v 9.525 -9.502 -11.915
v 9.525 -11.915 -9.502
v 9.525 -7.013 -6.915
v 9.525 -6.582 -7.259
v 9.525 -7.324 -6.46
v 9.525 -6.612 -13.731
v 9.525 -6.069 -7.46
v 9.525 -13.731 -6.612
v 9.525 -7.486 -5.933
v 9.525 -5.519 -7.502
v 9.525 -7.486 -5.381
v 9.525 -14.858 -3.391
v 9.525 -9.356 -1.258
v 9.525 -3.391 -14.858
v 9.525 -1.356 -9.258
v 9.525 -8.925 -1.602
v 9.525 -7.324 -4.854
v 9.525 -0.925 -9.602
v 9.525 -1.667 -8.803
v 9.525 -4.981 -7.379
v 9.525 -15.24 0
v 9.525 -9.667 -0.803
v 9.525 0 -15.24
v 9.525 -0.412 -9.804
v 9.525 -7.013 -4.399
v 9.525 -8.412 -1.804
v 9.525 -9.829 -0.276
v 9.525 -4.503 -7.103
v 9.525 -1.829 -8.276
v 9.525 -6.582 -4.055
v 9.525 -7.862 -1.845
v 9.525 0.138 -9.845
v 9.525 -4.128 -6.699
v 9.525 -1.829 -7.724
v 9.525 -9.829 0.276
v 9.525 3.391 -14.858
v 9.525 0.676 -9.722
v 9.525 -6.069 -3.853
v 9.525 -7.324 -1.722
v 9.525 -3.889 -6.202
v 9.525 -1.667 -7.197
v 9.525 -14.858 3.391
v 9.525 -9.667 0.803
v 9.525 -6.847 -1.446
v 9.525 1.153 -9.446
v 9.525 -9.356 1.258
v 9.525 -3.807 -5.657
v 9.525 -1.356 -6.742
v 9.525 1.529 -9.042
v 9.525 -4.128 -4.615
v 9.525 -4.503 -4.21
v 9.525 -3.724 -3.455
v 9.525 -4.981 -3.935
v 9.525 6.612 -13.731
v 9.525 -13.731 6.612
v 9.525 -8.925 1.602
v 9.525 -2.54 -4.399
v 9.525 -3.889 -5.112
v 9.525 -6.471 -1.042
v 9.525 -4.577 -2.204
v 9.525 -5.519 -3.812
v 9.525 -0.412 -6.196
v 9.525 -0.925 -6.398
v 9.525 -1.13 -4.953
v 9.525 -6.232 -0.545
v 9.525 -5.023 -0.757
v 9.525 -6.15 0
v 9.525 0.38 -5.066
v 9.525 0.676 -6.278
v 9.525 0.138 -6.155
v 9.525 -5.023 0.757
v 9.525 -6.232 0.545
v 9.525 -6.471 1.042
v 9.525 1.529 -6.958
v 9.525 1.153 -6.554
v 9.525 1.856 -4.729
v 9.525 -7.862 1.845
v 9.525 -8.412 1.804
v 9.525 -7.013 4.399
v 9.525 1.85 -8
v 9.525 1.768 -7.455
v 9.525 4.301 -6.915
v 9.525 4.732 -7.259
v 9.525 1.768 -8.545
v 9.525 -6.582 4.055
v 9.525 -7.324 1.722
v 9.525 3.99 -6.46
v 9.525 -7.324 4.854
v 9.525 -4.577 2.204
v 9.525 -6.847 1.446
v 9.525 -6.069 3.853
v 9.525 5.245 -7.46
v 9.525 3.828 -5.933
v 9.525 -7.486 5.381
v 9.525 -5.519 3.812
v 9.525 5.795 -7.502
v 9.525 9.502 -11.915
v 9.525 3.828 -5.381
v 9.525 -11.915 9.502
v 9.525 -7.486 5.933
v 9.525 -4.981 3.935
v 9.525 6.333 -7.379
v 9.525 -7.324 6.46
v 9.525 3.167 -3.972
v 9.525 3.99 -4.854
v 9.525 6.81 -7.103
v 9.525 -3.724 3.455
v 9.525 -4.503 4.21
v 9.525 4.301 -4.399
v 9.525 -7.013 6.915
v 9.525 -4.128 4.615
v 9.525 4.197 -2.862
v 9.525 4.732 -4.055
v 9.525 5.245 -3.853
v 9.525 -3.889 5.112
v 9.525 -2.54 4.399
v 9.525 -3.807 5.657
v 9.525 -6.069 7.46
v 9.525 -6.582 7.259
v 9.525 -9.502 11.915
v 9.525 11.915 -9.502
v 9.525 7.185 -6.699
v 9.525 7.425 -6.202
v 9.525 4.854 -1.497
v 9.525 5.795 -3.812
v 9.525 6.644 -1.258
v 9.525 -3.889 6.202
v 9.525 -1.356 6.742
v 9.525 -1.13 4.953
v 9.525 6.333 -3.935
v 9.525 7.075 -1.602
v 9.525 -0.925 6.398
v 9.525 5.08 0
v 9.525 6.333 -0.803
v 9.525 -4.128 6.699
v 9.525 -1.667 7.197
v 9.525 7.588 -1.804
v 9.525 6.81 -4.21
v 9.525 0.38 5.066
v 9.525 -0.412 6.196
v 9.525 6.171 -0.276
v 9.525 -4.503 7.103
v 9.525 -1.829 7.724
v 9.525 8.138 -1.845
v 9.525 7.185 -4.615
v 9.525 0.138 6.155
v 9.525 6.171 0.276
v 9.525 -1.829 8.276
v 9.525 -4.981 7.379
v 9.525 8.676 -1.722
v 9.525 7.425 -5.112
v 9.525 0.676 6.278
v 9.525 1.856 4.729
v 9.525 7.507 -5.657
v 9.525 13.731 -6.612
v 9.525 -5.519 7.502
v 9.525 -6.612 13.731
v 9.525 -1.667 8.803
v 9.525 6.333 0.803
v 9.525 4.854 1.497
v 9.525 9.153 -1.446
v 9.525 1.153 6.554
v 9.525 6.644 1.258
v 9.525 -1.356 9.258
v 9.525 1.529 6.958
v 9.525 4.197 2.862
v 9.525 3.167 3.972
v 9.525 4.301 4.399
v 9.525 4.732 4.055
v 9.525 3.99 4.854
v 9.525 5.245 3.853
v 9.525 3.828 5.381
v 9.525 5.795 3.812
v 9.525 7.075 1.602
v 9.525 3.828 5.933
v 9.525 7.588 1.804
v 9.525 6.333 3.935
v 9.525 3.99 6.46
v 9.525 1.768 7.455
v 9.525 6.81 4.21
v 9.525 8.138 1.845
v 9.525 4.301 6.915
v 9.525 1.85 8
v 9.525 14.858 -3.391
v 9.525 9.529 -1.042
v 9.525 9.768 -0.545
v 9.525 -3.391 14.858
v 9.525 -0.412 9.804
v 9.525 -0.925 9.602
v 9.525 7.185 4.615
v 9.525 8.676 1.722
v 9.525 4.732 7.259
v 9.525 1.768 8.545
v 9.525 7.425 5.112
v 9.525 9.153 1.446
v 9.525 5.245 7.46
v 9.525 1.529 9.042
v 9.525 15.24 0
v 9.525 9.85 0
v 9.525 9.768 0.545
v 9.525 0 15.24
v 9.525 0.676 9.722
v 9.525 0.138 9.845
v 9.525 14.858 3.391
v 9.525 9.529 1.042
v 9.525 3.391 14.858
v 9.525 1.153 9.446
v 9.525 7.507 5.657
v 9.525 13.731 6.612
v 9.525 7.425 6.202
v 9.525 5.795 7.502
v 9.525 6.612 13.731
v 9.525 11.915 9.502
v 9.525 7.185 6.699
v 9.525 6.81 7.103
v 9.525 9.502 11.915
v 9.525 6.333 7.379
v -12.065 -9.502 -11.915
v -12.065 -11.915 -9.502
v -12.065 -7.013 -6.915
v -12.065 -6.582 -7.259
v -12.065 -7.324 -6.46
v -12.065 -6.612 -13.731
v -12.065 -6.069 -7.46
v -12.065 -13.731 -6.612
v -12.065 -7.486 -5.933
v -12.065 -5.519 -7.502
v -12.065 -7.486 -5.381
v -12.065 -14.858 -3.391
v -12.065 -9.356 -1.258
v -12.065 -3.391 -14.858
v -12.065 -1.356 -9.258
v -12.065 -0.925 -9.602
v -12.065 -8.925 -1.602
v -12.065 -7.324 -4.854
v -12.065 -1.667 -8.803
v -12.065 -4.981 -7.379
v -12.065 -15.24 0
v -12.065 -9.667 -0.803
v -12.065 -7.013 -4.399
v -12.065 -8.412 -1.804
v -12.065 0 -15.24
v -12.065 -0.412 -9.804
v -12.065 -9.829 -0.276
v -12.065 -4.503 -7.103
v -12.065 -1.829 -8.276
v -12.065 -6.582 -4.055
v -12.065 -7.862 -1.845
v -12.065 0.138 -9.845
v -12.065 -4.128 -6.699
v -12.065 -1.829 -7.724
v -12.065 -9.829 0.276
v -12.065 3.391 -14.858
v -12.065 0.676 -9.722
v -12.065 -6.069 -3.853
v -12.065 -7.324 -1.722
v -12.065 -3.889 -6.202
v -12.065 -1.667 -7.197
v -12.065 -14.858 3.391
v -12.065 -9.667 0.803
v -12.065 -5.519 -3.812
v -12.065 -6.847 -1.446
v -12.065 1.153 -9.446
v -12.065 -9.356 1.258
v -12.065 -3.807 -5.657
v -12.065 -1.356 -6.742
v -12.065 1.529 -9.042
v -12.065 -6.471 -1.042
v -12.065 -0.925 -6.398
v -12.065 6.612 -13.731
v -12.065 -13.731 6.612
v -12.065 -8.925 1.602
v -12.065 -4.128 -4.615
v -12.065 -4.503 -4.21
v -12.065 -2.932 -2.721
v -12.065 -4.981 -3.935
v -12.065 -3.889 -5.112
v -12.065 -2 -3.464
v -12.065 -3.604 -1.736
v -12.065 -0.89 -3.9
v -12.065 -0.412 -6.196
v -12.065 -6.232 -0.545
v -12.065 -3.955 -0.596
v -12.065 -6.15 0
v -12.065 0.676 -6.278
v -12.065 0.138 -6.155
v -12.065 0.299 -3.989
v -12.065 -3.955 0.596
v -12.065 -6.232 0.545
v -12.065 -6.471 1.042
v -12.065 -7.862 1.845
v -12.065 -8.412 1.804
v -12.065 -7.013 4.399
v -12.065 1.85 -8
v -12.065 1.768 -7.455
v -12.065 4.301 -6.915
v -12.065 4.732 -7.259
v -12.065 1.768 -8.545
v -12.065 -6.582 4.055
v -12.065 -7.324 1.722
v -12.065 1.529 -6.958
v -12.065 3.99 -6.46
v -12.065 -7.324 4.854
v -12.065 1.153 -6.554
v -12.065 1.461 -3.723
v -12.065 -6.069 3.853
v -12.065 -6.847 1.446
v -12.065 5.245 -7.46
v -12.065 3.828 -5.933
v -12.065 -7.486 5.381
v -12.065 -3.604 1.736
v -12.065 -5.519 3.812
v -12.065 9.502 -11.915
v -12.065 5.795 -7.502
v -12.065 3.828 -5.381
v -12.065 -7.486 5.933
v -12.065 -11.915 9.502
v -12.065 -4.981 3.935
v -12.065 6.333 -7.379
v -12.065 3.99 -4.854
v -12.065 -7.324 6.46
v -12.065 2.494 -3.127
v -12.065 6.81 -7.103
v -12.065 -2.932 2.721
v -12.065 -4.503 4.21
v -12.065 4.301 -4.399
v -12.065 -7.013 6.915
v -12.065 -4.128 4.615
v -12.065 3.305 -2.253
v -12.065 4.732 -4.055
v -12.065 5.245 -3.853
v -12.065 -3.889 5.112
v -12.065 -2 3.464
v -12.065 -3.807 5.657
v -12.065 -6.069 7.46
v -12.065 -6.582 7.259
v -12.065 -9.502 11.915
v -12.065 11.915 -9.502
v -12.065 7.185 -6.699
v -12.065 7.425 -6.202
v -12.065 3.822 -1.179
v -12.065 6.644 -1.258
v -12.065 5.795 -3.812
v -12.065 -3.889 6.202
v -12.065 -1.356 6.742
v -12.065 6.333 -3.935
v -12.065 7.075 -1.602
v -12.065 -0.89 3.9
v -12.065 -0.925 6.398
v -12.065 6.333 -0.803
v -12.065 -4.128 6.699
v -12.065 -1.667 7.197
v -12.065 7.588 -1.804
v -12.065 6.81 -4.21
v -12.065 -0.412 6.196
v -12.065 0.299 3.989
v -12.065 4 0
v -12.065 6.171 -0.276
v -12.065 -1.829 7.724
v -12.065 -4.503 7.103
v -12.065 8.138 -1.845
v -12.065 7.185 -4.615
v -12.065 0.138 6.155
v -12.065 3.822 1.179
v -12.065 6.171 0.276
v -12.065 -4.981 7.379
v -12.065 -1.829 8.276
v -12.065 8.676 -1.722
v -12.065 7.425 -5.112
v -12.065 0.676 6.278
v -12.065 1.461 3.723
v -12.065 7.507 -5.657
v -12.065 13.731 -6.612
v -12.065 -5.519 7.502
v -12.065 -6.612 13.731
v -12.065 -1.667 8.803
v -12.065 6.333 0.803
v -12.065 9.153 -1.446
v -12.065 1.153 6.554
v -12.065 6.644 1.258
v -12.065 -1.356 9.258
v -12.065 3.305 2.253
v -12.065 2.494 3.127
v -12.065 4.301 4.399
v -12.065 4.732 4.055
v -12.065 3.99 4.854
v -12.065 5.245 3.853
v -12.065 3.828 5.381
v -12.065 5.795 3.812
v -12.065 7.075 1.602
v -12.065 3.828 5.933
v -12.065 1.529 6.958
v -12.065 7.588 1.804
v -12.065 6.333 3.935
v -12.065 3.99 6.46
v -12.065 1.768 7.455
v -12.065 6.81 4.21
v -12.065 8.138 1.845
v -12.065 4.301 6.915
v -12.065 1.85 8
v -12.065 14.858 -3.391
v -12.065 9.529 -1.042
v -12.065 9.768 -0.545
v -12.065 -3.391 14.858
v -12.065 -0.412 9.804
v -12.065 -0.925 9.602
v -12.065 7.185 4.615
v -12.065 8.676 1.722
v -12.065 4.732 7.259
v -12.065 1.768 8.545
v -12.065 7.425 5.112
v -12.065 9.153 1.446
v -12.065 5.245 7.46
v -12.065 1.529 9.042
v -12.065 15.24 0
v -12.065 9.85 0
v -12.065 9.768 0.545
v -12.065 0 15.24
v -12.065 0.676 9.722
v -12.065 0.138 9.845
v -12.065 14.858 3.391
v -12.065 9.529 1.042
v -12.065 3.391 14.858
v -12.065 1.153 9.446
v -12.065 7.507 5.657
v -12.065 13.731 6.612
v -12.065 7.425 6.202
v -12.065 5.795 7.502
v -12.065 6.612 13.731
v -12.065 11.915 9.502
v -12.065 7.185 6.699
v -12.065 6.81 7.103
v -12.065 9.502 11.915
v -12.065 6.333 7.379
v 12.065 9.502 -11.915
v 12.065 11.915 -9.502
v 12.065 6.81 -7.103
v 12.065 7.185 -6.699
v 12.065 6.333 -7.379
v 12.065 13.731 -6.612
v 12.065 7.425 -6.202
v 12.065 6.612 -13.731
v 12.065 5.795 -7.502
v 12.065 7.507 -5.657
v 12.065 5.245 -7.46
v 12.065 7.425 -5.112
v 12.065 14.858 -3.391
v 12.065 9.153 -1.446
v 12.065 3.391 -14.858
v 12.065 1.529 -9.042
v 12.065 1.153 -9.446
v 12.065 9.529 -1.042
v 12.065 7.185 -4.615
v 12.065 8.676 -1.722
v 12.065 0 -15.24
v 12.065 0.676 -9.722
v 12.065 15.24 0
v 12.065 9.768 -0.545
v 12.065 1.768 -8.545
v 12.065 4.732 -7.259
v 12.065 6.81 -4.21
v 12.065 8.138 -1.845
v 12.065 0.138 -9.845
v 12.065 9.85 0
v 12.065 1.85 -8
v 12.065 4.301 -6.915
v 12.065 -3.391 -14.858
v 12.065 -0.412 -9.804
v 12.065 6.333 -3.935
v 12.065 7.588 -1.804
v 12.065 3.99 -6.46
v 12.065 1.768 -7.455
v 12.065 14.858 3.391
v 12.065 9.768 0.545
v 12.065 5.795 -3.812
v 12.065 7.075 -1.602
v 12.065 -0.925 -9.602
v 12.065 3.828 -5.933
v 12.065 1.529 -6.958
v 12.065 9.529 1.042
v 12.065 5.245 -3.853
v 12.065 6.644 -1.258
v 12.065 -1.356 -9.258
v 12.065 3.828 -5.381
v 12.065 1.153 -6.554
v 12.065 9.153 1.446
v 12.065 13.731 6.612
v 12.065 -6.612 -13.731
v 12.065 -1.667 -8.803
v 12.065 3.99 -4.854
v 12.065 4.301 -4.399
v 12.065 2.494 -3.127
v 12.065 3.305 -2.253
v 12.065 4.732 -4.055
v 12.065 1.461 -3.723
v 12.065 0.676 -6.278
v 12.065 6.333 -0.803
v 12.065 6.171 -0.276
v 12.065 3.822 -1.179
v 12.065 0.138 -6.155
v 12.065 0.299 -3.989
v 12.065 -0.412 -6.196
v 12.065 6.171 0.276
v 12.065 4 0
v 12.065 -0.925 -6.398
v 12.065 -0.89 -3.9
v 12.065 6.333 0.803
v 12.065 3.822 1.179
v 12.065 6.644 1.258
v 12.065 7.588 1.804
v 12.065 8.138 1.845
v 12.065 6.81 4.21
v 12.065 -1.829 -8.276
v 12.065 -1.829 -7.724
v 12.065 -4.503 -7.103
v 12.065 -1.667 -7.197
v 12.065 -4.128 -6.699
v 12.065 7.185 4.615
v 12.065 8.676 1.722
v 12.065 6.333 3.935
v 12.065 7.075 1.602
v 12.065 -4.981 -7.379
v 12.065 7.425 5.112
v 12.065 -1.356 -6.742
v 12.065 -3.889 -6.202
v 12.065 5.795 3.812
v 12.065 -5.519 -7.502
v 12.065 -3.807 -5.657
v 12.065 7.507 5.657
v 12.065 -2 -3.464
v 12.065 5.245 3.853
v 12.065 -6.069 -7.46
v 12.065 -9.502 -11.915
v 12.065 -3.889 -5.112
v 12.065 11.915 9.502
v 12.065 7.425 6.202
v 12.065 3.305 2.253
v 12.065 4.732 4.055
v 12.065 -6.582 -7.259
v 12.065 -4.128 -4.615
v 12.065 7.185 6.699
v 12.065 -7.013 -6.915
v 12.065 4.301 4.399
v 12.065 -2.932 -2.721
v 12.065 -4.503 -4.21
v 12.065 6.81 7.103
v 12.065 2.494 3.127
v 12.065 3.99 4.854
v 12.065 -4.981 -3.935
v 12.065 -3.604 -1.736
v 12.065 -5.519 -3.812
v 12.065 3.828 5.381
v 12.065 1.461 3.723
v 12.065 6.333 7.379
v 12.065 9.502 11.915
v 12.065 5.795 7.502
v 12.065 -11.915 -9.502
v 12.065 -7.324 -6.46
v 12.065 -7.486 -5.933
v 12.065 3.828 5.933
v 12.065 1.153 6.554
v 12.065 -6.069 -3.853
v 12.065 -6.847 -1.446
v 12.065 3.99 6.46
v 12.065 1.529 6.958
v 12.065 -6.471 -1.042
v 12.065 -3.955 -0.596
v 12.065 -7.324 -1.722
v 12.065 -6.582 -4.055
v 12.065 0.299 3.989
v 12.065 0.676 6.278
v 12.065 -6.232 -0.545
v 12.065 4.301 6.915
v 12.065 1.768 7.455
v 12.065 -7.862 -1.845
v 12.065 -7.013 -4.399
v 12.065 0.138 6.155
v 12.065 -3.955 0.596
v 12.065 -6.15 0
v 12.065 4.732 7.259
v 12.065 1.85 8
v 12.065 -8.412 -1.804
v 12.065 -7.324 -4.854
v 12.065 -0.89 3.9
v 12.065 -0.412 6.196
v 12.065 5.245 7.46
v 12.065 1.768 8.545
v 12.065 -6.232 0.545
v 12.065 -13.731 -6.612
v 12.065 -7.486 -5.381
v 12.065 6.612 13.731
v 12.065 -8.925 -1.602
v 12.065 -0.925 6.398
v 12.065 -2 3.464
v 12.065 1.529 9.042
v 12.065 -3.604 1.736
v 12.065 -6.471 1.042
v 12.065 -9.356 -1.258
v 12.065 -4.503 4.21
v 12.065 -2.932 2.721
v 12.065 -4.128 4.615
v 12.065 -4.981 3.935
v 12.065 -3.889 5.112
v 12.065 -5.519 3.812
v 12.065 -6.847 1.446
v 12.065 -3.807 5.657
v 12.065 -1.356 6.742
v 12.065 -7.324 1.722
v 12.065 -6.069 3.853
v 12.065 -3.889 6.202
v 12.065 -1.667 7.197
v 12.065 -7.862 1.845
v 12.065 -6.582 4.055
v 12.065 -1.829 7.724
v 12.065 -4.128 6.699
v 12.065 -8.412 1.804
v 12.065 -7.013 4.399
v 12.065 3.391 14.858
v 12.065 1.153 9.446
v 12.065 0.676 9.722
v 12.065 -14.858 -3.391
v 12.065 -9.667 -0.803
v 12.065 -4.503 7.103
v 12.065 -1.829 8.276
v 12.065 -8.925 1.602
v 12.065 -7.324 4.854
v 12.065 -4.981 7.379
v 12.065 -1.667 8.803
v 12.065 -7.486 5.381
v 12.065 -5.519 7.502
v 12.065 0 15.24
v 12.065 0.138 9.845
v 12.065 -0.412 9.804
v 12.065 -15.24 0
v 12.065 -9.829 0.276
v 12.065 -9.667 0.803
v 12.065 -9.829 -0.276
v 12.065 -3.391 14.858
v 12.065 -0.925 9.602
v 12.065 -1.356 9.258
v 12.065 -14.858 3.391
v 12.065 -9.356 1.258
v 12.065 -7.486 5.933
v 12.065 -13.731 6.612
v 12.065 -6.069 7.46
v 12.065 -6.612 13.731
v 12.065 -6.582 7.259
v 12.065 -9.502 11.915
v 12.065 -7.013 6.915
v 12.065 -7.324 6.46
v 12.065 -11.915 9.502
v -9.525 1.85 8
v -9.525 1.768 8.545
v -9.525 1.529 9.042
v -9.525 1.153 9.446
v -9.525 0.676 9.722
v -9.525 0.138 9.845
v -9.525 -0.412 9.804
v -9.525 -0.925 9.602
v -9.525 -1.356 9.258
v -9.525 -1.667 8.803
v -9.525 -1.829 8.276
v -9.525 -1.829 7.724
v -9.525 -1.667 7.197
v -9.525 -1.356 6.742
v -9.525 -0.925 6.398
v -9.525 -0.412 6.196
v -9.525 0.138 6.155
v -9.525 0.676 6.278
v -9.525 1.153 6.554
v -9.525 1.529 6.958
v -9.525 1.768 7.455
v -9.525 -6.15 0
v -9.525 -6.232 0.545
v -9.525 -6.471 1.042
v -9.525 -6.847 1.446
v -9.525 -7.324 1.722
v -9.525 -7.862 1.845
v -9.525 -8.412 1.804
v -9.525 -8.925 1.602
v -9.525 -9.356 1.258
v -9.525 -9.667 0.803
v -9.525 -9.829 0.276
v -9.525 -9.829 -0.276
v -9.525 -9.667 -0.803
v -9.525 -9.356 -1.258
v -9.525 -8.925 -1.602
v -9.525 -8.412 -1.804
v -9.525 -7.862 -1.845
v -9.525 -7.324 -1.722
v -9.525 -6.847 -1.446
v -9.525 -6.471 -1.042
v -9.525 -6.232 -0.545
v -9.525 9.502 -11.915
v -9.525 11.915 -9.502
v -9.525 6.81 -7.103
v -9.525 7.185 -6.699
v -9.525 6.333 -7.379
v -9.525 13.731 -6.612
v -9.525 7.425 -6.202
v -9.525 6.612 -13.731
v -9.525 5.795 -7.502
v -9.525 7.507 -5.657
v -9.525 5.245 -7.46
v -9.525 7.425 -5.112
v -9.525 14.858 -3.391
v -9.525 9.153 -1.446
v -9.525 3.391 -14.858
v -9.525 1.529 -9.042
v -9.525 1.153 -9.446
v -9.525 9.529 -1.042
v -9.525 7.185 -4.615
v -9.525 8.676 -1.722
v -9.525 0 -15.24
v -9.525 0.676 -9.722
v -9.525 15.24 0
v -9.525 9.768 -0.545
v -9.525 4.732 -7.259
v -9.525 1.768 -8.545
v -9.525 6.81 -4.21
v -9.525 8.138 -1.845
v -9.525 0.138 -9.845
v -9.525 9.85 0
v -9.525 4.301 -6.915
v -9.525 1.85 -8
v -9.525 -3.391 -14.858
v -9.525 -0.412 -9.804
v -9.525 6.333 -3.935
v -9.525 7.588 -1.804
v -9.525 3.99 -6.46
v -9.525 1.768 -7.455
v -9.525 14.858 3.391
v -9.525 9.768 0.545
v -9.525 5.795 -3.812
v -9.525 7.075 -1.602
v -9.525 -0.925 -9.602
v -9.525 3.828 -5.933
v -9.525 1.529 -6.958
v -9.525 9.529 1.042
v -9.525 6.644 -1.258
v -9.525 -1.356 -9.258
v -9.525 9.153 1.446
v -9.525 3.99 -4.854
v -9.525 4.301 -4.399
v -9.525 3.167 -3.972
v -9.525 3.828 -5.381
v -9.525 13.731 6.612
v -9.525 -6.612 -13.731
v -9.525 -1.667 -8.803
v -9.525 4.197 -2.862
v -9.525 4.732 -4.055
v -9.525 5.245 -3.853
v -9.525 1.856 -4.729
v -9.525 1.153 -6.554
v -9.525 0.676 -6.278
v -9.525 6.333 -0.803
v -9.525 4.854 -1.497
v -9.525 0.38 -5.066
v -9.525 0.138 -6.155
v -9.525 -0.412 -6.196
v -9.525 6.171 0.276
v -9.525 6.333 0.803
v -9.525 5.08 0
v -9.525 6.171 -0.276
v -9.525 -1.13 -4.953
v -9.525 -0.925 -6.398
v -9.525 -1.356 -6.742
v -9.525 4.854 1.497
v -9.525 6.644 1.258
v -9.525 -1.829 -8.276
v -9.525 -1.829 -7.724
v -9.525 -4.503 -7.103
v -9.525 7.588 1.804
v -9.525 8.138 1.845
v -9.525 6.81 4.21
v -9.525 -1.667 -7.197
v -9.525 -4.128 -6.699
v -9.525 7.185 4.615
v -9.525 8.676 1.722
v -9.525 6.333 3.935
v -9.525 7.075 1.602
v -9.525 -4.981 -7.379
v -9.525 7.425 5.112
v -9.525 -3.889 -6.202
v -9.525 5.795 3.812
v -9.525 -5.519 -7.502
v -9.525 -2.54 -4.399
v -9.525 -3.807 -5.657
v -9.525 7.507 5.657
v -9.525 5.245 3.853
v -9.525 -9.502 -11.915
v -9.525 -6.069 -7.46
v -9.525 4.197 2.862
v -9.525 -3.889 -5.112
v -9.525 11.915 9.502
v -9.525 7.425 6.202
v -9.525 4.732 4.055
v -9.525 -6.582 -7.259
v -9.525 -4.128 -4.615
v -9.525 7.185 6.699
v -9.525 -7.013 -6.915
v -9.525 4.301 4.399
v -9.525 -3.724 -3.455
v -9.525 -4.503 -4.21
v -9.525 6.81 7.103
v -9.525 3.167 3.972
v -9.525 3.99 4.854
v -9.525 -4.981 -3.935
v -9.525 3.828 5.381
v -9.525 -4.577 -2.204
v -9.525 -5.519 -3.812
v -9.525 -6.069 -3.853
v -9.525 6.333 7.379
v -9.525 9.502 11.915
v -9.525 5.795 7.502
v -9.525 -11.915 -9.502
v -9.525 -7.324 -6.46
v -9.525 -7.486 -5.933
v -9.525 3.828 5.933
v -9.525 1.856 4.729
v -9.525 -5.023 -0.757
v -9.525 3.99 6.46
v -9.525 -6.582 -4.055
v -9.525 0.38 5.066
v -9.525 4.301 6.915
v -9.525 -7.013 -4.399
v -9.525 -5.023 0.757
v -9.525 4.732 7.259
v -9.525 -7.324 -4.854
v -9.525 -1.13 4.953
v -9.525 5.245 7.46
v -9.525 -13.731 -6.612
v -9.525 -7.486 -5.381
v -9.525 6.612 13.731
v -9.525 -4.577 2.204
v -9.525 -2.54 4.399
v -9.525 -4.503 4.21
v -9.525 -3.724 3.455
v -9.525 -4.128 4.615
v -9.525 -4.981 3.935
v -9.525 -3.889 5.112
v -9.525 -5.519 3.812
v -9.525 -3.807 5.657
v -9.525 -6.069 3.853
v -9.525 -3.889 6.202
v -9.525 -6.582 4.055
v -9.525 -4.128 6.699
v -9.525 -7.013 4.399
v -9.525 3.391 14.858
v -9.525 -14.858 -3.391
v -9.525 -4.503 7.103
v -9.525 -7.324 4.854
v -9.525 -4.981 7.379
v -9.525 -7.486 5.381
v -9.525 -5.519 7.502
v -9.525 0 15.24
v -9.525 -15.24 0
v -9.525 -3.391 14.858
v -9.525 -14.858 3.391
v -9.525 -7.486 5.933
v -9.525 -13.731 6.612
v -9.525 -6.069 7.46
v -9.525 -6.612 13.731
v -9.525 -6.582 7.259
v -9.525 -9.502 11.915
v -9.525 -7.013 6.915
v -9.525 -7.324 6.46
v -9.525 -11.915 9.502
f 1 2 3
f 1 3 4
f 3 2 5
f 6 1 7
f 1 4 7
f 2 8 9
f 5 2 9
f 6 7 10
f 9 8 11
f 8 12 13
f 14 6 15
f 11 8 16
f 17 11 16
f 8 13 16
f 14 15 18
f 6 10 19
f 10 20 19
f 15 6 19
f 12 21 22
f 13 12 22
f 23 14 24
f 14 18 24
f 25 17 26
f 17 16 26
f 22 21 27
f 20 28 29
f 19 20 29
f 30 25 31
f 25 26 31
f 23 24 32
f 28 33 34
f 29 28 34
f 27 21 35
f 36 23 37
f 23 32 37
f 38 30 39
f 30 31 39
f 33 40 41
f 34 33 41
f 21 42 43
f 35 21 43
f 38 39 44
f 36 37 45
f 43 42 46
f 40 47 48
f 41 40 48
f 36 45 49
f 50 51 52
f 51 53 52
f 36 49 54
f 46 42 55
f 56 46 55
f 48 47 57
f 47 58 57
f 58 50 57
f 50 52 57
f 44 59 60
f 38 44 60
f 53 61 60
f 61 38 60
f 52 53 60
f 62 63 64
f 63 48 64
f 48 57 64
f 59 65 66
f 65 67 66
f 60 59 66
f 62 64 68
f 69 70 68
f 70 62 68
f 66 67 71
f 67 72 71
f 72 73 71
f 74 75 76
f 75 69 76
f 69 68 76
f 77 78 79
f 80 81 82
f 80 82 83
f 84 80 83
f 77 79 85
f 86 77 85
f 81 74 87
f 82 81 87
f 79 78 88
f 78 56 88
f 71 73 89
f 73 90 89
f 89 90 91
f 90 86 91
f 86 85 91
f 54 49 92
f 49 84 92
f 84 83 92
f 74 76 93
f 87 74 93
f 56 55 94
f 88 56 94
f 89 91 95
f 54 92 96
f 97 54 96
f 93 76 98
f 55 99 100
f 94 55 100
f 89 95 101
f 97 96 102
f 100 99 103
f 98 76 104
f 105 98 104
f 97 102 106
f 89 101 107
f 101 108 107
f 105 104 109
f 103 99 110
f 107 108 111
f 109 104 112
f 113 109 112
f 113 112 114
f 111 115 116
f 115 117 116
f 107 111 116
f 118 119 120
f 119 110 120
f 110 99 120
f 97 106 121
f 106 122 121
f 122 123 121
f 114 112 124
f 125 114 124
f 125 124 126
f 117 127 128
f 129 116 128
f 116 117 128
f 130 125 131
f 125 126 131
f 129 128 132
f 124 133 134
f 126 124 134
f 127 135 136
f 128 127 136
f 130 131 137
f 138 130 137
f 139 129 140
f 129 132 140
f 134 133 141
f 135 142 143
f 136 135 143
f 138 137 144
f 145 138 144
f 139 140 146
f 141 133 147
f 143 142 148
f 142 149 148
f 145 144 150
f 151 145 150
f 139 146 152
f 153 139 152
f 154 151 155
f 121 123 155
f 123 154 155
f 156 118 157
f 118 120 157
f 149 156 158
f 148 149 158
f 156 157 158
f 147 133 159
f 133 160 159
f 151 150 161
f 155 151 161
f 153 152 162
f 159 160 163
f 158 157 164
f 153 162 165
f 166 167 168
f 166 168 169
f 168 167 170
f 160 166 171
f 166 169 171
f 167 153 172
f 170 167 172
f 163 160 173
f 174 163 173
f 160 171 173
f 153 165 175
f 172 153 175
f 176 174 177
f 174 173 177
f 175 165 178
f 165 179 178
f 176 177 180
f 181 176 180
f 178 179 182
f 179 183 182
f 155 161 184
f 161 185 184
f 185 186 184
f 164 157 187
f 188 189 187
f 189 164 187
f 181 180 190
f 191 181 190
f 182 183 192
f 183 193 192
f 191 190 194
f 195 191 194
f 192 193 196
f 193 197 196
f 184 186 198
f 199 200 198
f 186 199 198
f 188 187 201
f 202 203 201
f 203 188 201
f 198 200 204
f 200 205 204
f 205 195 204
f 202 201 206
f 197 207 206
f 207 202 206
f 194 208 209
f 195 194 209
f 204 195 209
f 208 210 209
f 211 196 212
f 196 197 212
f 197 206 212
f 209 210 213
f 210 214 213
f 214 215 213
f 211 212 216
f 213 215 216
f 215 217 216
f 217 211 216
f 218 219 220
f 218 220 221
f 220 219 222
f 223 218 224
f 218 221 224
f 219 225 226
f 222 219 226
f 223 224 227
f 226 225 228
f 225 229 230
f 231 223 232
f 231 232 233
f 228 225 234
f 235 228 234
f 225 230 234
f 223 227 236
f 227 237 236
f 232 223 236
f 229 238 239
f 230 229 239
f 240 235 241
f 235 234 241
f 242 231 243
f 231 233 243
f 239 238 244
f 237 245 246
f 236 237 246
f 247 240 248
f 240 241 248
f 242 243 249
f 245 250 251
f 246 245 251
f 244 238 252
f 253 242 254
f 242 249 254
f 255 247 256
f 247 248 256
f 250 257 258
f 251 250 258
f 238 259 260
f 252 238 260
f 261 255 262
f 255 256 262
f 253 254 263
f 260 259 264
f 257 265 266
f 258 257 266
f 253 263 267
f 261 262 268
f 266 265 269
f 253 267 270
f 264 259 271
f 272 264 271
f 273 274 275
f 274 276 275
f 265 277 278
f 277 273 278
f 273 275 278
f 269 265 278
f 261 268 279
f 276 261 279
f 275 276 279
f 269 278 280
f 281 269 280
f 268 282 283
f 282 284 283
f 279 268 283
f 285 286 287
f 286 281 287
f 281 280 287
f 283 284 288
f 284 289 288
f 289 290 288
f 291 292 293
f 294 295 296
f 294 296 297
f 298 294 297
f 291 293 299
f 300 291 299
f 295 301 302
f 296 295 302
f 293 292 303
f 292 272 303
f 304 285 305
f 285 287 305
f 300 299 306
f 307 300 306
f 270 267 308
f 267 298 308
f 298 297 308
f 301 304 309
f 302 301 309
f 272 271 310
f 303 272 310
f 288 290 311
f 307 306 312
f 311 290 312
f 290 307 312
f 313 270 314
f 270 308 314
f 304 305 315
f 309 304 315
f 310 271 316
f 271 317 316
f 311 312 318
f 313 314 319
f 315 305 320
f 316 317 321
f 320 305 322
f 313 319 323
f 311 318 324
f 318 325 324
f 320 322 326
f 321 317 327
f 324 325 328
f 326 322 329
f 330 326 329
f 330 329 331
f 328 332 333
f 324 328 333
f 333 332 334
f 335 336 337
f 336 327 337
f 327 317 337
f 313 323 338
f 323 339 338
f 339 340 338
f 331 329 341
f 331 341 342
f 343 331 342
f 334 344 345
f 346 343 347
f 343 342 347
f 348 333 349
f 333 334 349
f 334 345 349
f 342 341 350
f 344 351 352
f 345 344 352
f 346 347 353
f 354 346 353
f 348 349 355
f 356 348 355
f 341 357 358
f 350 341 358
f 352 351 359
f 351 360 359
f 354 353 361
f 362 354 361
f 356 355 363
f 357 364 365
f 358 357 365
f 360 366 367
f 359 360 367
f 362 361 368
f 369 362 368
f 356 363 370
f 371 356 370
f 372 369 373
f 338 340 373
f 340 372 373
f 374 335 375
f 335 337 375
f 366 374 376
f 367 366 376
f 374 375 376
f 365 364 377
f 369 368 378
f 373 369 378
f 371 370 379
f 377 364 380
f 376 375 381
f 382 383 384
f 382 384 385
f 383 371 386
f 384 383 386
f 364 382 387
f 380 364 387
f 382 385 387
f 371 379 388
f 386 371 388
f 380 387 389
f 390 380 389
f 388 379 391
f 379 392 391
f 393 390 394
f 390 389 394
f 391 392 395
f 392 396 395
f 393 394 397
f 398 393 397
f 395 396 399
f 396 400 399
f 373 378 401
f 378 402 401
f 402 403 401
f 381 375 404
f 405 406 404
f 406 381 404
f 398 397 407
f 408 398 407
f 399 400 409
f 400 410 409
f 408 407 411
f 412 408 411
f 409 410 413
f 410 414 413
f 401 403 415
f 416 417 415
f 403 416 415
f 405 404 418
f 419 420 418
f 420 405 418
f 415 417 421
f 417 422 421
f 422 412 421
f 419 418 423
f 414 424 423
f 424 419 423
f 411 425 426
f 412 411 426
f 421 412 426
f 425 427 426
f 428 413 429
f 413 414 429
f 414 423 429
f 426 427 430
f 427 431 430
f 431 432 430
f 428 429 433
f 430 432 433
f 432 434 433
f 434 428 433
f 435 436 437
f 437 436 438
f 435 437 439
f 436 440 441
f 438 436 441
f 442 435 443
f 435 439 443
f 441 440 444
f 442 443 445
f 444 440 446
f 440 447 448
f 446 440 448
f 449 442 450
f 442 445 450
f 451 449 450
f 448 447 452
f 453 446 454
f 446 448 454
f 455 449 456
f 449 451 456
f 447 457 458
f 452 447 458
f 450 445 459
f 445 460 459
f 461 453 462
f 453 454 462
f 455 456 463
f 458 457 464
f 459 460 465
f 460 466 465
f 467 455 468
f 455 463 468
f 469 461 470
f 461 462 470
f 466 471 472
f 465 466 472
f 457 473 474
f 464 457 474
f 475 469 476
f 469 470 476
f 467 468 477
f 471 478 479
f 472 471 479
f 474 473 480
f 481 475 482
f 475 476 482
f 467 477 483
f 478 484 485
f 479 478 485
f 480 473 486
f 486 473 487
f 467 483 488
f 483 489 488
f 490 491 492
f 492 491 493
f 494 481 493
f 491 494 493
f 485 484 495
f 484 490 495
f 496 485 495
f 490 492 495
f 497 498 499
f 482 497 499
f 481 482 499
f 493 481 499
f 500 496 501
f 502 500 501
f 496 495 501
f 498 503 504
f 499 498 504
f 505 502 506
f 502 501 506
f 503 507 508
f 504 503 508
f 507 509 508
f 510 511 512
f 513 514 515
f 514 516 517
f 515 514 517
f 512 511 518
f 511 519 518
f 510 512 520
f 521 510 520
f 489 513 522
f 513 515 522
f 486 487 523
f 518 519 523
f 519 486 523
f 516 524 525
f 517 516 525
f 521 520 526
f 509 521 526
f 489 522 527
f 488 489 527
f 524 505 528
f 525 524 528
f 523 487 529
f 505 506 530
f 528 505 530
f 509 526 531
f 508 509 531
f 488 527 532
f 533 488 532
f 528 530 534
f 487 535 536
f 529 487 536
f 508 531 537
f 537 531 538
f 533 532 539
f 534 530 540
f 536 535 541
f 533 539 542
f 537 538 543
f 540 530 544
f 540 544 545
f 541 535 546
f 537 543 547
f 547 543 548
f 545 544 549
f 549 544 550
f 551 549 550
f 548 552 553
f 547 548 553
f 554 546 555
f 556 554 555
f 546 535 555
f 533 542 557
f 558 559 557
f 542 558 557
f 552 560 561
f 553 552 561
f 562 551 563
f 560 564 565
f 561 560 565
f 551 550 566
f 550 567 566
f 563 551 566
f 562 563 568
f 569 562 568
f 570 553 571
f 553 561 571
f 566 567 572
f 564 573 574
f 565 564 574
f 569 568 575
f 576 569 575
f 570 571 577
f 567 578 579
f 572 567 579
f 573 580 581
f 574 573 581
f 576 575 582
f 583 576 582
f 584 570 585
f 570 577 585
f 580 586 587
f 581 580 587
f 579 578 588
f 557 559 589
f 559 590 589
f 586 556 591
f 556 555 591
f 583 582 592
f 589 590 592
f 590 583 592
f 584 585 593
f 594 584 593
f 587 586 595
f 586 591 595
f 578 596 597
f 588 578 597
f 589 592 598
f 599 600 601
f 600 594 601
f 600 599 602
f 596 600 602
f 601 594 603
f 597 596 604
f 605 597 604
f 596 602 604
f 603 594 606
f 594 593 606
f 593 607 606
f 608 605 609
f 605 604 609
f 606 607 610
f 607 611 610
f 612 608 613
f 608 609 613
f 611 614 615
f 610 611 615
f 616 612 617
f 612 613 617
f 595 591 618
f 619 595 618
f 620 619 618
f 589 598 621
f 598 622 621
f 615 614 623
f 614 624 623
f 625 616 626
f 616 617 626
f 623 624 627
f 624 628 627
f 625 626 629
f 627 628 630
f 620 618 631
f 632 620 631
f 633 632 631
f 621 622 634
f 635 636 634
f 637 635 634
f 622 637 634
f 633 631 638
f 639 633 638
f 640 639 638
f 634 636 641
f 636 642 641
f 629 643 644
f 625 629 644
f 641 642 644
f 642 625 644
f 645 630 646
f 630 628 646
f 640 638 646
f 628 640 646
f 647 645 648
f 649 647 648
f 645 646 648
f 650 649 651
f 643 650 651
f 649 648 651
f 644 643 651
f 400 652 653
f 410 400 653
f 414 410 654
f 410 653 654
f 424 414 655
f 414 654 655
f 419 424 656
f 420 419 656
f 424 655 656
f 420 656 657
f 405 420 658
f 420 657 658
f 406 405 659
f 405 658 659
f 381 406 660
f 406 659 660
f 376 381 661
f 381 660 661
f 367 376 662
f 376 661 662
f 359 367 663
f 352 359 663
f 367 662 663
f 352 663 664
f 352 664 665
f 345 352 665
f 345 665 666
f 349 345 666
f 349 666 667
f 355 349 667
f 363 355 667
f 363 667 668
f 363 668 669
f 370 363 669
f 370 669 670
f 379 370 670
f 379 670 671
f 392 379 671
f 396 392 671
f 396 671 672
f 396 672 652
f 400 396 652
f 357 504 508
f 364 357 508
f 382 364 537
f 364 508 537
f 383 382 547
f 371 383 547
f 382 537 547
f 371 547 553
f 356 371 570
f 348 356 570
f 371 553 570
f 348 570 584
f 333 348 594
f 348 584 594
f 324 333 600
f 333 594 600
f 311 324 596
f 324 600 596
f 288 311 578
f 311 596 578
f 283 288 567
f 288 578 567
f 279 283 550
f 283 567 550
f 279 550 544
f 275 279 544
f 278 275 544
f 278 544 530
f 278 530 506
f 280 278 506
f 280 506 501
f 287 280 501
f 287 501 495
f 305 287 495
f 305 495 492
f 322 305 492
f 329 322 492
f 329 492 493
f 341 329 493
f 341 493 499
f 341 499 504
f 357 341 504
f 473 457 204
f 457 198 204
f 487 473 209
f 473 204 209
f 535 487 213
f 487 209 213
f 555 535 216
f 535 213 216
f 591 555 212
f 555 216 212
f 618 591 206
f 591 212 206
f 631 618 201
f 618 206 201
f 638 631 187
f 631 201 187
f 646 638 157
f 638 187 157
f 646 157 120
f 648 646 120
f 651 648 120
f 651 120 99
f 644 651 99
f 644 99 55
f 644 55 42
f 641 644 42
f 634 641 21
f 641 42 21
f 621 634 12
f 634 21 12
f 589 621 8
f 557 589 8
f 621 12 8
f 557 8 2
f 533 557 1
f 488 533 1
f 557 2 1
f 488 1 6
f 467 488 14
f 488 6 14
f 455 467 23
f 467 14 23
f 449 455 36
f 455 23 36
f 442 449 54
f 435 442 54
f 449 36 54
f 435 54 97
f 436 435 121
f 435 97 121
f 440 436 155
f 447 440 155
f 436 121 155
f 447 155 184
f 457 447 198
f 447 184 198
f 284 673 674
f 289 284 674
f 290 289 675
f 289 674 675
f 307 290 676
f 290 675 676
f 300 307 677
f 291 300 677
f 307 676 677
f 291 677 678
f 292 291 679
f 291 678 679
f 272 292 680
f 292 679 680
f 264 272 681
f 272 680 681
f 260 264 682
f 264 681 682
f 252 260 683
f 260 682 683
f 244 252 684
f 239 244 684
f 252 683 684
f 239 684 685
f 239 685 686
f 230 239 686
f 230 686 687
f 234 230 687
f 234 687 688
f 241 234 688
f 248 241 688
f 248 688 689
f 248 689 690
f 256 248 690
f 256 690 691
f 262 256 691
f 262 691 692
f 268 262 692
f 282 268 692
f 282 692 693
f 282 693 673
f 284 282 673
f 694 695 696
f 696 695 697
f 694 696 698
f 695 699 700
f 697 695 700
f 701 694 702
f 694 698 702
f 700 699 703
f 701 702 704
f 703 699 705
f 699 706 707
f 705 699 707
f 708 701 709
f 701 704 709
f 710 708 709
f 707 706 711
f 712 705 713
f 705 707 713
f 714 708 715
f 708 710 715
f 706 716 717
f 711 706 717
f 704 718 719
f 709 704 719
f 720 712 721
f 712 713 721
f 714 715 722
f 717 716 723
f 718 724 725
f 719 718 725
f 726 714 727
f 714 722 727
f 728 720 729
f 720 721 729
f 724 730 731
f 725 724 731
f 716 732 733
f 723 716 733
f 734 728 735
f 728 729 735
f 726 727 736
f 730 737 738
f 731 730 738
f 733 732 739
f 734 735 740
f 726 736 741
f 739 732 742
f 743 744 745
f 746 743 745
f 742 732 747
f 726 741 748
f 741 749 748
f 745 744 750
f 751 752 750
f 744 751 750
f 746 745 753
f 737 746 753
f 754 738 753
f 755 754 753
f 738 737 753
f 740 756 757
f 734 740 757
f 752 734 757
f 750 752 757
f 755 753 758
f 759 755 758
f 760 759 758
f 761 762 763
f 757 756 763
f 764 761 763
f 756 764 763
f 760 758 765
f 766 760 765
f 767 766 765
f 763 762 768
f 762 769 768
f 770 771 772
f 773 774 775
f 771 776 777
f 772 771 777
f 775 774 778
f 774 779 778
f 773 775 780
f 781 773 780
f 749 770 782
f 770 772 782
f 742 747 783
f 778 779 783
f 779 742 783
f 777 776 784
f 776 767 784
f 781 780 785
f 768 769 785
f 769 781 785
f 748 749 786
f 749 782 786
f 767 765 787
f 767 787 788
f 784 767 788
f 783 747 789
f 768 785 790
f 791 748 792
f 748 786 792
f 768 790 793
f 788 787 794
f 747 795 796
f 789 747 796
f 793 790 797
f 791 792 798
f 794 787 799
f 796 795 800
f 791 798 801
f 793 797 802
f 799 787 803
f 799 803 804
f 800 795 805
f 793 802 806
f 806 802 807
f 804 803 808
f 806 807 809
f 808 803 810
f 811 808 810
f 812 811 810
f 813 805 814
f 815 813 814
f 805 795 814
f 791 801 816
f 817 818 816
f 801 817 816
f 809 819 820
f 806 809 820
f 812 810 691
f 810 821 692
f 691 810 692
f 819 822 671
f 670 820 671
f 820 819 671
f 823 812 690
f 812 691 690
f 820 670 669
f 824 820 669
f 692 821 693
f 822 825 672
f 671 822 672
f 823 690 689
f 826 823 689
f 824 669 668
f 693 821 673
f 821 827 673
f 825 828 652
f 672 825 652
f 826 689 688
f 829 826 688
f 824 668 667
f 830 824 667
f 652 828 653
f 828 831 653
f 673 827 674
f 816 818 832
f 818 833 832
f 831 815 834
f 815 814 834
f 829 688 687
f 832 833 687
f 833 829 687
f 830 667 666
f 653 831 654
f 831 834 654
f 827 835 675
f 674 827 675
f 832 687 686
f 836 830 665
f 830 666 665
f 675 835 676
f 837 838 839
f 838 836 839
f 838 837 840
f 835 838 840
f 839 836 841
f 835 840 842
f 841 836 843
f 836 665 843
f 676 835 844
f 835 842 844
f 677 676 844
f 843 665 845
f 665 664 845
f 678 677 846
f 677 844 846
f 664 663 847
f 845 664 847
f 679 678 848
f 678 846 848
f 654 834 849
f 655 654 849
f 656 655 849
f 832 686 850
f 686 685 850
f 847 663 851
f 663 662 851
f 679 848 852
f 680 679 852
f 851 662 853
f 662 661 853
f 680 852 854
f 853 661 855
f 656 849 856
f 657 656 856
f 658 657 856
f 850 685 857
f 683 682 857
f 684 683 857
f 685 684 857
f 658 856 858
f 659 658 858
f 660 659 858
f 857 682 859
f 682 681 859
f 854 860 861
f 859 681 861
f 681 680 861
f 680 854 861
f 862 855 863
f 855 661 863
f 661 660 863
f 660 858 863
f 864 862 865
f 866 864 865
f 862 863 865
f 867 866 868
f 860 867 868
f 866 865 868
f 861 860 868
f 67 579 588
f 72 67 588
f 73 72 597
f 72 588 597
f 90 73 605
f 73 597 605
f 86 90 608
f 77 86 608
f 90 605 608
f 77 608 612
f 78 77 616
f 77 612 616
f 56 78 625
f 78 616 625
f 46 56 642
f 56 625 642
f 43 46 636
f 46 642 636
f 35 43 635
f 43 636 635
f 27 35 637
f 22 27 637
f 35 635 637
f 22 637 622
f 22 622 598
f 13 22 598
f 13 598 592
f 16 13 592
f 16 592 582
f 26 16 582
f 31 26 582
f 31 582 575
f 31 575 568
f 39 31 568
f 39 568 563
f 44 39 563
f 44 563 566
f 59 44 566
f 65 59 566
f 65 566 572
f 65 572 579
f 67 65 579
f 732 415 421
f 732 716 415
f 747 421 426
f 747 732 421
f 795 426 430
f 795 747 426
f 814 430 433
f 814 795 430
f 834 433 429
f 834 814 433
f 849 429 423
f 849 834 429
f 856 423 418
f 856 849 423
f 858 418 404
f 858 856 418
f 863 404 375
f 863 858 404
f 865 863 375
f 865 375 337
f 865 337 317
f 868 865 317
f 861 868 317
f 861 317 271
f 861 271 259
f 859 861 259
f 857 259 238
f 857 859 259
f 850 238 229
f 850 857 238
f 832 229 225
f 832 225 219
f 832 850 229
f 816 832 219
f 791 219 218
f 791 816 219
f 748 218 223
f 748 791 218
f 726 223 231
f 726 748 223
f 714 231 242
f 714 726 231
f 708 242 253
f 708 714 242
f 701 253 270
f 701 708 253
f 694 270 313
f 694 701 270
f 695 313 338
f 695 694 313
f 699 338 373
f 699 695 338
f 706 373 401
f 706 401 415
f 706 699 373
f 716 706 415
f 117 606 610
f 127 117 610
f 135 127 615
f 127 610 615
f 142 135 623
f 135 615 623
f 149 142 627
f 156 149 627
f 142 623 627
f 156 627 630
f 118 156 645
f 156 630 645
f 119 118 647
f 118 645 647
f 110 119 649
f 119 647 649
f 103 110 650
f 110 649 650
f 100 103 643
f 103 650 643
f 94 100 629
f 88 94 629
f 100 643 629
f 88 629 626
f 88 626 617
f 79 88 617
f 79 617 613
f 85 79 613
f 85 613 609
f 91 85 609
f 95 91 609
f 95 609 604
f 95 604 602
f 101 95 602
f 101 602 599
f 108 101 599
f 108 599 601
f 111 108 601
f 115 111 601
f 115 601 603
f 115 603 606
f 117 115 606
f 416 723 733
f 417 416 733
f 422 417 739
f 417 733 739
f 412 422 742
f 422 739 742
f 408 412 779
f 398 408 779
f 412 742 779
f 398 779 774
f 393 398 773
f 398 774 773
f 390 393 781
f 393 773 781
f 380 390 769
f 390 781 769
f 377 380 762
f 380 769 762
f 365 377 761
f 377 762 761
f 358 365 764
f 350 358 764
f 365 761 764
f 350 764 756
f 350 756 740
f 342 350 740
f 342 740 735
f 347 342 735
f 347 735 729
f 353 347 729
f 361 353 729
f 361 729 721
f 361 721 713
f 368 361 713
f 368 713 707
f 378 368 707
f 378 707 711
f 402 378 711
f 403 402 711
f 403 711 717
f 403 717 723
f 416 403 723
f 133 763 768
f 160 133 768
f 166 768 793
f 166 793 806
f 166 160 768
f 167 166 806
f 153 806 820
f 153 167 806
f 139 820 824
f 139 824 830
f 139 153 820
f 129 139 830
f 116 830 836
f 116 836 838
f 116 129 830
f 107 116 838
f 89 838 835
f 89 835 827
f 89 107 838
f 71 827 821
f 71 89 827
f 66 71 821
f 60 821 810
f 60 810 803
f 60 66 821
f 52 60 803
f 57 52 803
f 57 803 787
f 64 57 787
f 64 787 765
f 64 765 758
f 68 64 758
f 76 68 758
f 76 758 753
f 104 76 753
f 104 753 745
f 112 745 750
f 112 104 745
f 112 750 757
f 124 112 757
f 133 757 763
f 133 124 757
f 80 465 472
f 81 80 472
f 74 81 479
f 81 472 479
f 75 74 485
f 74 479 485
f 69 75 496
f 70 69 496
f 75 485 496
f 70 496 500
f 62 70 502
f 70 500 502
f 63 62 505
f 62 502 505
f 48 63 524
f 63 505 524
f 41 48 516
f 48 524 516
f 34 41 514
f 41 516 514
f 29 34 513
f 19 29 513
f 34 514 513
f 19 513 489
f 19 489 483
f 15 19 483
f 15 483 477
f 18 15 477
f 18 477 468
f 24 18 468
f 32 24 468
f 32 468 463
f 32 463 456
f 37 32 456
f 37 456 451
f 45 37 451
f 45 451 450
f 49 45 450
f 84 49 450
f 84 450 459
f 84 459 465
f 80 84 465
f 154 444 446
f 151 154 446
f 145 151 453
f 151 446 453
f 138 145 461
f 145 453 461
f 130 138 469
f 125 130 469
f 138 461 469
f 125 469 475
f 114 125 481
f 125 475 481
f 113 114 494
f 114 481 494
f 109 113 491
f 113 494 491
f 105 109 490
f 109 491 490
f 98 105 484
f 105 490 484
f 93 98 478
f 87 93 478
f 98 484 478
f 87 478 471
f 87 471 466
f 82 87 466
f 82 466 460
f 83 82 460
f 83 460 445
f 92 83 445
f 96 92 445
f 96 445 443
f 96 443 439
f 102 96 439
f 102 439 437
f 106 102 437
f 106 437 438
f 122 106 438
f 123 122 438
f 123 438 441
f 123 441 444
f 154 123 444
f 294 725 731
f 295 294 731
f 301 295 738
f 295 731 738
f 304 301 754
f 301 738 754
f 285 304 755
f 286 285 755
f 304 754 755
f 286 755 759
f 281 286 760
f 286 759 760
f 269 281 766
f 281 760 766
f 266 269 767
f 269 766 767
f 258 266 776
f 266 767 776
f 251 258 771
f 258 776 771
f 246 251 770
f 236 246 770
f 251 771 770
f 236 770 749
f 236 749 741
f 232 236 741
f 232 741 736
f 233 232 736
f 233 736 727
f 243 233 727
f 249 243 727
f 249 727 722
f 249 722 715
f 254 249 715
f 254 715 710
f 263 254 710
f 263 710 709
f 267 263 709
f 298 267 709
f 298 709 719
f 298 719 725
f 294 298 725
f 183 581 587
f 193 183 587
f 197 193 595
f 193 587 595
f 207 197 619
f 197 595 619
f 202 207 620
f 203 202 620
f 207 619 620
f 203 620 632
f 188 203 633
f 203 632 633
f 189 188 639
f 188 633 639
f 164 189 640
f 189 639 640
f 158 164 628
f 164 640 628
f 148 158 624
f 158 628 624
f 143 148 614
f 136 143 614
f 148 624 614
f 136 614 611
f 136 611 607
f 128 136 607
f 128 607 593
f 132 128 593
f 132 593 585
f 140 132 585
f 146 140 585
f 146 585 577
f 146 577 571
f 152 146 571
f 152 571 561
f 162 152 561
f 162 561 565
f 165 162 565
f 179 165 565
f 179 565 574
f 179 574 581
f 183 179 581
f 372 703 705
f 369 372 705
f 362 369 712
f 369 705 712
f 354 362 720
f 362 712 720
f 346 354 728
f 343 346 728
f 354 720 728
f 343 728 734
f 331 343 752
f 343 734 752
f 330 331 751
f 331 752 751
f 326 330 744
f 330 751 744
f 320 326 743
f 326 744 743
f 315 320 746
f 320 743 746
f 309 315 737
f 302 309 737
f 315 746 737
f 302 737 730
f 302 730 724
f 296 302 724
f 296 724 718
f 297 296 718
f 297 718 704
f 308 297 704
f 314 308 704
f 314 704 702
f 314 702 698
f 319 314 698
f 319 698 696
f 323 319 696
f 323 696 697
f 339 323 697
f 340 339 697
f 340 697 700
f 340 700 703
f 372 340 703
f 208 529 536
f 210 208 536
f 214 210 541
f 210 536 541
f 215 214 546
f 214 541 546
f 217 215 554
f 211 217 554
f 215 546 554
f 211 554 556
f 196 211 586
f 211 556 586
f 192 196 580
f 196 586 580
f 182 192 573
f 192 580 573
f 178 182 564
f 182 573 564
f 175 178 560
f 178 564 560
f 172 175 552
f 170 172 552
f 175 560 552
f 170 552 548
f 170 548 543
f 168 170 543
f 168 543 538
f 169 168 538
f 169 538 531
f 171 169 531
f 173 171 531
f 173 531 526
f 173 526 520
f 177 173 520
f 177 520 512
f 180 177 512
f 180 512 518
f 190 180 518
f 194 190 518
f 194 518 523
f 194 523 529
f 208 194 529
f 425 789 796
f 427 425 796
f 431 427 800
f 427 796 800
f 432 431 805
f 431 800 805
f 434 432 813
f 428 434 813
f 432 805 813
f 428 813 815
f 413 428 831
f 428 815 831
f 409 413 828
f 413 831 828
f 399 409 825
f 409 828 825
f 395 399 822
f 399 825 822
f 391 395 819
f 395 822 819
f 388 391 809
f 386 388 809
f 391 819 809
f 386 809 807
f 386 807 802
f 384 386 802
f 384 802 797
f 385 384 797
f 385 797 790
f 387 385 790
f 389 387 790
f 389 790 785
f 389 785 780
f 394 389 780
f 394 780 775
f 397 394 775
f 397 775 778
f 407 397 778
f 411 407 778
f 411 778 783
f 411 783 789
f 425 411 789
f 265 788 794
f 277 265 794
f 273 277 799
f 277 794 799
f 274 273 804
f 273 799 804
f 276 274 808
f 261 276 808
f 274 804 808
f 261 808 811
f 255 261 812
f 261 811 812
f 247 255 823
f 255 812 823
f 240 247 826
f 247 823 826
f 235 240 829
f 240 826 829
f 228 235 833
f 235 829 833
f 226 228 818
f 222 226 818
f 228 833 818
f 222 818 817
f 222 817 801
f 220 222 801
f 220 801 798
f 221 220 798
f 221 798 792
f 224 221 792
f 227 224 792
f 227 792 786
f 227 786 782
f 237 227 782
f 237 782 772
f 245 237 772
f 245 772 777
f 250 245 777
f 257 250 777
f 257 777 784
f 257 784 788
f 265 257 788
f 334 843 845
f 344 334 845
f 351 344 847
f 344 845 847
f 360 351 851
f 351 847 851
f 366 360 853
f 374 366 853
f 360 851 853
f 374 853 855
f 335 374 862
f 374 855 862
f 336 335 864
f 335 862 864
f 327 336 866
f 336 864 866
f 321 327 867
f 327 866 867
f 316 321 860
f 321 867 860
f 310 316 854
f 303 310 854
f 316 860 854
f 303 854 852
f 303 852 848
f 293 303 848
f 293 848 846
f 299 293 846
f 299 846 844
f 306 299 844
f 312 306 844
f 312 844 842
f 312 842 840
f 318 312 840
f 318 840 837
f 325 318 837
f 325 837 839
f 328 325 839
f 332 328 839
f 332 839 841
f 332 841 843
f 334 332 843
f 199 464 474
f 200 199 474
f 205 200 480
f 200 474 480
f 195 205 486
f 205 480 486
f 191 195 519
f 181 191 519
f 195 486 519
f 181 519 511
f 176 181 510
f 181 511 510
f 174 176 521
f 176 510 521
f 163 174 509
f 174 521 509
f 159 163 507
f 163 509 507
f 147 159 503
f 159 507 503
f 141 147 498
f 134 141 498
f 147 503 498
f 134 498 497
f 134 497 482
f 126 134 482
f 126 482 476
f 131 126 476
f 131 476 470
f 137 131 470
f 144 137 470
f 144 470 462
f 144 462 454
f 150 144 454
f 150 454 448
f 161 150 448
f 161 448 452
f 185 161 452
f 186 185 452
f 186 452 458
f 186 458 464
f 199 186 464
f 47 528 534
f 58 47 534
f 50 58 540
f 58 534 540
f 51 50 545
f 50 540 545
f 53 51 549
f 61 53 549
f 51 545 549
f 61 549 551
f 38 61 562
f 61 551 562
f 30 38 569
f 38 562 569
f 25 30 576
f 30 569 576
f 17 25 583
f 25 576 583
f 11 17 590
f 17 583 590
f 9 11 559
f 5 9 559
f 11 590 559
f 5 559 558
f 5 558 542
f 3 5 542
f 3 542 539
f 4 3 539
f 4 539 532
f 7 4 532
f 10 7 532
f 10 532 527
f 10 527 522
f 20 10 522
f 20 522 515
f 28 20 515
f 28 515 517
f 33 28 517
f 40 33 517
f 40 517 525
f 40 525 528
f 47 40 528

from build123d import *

# Parameters (mm, degrees)
F0_W     = 2.54
F0_H     = 10.16
F0_H_2   = 5.08
F0_W_2   = 19.05
F2_R     = 4
F2_R_2   = 1.85
F3_DEPTH = 25.4


with BuildPart() as f1:
    # F0 (on Top) → F1 (revolve)
    with BuildSketch(Plane.XY):
        with Locations((-10.795, 10.16)):
            Rectangle(F0_W, F0_H)
        with Locations((-10.795, 2.54)):
            Rectangle(F0_W, F0_H_2)
        with Locations((0, 2.54)):
            Rectangle(F0_W_2, F0_H_2)
        Polygon((9.525, 15.24), (9.525, 5.08), (9.525, 0), (12.065, 0), (12.065, 15.24), align=None)
    revolve(axis=Axis((0, 0, 0), (1, 0, 0)))

    # F2 (on face) → F3 (cut)
    with BuildSketch(Plane.YZ.offset(12.065)):
        Circle(F2_R)
        with Locations((0, 8)):
            Circle(F2_R_2)
        with Locations((-5.656854, 5.656854)):
            Circle(F2_R_2)
        with Locations((-8, 0)):
            Circle(F2_R_2)
        with Locations((-5.656854, -5.656854)):
            Circle(F2_R_2)
        with Locations((0, -8)):
            Circle(F2_R_2)
        with Locations((5.656854, -5.656854)):
            Circle(F2_R_2)
        with Locations((8, 0)):
            Circle(F2_R_2)
        with Locations((5.656854, 5.656854)):
            Circle(F2_R_2)
    extrude(amount=-F3_DEPTH, mode=Mode.SUBTRACT)


solid = f1.part
